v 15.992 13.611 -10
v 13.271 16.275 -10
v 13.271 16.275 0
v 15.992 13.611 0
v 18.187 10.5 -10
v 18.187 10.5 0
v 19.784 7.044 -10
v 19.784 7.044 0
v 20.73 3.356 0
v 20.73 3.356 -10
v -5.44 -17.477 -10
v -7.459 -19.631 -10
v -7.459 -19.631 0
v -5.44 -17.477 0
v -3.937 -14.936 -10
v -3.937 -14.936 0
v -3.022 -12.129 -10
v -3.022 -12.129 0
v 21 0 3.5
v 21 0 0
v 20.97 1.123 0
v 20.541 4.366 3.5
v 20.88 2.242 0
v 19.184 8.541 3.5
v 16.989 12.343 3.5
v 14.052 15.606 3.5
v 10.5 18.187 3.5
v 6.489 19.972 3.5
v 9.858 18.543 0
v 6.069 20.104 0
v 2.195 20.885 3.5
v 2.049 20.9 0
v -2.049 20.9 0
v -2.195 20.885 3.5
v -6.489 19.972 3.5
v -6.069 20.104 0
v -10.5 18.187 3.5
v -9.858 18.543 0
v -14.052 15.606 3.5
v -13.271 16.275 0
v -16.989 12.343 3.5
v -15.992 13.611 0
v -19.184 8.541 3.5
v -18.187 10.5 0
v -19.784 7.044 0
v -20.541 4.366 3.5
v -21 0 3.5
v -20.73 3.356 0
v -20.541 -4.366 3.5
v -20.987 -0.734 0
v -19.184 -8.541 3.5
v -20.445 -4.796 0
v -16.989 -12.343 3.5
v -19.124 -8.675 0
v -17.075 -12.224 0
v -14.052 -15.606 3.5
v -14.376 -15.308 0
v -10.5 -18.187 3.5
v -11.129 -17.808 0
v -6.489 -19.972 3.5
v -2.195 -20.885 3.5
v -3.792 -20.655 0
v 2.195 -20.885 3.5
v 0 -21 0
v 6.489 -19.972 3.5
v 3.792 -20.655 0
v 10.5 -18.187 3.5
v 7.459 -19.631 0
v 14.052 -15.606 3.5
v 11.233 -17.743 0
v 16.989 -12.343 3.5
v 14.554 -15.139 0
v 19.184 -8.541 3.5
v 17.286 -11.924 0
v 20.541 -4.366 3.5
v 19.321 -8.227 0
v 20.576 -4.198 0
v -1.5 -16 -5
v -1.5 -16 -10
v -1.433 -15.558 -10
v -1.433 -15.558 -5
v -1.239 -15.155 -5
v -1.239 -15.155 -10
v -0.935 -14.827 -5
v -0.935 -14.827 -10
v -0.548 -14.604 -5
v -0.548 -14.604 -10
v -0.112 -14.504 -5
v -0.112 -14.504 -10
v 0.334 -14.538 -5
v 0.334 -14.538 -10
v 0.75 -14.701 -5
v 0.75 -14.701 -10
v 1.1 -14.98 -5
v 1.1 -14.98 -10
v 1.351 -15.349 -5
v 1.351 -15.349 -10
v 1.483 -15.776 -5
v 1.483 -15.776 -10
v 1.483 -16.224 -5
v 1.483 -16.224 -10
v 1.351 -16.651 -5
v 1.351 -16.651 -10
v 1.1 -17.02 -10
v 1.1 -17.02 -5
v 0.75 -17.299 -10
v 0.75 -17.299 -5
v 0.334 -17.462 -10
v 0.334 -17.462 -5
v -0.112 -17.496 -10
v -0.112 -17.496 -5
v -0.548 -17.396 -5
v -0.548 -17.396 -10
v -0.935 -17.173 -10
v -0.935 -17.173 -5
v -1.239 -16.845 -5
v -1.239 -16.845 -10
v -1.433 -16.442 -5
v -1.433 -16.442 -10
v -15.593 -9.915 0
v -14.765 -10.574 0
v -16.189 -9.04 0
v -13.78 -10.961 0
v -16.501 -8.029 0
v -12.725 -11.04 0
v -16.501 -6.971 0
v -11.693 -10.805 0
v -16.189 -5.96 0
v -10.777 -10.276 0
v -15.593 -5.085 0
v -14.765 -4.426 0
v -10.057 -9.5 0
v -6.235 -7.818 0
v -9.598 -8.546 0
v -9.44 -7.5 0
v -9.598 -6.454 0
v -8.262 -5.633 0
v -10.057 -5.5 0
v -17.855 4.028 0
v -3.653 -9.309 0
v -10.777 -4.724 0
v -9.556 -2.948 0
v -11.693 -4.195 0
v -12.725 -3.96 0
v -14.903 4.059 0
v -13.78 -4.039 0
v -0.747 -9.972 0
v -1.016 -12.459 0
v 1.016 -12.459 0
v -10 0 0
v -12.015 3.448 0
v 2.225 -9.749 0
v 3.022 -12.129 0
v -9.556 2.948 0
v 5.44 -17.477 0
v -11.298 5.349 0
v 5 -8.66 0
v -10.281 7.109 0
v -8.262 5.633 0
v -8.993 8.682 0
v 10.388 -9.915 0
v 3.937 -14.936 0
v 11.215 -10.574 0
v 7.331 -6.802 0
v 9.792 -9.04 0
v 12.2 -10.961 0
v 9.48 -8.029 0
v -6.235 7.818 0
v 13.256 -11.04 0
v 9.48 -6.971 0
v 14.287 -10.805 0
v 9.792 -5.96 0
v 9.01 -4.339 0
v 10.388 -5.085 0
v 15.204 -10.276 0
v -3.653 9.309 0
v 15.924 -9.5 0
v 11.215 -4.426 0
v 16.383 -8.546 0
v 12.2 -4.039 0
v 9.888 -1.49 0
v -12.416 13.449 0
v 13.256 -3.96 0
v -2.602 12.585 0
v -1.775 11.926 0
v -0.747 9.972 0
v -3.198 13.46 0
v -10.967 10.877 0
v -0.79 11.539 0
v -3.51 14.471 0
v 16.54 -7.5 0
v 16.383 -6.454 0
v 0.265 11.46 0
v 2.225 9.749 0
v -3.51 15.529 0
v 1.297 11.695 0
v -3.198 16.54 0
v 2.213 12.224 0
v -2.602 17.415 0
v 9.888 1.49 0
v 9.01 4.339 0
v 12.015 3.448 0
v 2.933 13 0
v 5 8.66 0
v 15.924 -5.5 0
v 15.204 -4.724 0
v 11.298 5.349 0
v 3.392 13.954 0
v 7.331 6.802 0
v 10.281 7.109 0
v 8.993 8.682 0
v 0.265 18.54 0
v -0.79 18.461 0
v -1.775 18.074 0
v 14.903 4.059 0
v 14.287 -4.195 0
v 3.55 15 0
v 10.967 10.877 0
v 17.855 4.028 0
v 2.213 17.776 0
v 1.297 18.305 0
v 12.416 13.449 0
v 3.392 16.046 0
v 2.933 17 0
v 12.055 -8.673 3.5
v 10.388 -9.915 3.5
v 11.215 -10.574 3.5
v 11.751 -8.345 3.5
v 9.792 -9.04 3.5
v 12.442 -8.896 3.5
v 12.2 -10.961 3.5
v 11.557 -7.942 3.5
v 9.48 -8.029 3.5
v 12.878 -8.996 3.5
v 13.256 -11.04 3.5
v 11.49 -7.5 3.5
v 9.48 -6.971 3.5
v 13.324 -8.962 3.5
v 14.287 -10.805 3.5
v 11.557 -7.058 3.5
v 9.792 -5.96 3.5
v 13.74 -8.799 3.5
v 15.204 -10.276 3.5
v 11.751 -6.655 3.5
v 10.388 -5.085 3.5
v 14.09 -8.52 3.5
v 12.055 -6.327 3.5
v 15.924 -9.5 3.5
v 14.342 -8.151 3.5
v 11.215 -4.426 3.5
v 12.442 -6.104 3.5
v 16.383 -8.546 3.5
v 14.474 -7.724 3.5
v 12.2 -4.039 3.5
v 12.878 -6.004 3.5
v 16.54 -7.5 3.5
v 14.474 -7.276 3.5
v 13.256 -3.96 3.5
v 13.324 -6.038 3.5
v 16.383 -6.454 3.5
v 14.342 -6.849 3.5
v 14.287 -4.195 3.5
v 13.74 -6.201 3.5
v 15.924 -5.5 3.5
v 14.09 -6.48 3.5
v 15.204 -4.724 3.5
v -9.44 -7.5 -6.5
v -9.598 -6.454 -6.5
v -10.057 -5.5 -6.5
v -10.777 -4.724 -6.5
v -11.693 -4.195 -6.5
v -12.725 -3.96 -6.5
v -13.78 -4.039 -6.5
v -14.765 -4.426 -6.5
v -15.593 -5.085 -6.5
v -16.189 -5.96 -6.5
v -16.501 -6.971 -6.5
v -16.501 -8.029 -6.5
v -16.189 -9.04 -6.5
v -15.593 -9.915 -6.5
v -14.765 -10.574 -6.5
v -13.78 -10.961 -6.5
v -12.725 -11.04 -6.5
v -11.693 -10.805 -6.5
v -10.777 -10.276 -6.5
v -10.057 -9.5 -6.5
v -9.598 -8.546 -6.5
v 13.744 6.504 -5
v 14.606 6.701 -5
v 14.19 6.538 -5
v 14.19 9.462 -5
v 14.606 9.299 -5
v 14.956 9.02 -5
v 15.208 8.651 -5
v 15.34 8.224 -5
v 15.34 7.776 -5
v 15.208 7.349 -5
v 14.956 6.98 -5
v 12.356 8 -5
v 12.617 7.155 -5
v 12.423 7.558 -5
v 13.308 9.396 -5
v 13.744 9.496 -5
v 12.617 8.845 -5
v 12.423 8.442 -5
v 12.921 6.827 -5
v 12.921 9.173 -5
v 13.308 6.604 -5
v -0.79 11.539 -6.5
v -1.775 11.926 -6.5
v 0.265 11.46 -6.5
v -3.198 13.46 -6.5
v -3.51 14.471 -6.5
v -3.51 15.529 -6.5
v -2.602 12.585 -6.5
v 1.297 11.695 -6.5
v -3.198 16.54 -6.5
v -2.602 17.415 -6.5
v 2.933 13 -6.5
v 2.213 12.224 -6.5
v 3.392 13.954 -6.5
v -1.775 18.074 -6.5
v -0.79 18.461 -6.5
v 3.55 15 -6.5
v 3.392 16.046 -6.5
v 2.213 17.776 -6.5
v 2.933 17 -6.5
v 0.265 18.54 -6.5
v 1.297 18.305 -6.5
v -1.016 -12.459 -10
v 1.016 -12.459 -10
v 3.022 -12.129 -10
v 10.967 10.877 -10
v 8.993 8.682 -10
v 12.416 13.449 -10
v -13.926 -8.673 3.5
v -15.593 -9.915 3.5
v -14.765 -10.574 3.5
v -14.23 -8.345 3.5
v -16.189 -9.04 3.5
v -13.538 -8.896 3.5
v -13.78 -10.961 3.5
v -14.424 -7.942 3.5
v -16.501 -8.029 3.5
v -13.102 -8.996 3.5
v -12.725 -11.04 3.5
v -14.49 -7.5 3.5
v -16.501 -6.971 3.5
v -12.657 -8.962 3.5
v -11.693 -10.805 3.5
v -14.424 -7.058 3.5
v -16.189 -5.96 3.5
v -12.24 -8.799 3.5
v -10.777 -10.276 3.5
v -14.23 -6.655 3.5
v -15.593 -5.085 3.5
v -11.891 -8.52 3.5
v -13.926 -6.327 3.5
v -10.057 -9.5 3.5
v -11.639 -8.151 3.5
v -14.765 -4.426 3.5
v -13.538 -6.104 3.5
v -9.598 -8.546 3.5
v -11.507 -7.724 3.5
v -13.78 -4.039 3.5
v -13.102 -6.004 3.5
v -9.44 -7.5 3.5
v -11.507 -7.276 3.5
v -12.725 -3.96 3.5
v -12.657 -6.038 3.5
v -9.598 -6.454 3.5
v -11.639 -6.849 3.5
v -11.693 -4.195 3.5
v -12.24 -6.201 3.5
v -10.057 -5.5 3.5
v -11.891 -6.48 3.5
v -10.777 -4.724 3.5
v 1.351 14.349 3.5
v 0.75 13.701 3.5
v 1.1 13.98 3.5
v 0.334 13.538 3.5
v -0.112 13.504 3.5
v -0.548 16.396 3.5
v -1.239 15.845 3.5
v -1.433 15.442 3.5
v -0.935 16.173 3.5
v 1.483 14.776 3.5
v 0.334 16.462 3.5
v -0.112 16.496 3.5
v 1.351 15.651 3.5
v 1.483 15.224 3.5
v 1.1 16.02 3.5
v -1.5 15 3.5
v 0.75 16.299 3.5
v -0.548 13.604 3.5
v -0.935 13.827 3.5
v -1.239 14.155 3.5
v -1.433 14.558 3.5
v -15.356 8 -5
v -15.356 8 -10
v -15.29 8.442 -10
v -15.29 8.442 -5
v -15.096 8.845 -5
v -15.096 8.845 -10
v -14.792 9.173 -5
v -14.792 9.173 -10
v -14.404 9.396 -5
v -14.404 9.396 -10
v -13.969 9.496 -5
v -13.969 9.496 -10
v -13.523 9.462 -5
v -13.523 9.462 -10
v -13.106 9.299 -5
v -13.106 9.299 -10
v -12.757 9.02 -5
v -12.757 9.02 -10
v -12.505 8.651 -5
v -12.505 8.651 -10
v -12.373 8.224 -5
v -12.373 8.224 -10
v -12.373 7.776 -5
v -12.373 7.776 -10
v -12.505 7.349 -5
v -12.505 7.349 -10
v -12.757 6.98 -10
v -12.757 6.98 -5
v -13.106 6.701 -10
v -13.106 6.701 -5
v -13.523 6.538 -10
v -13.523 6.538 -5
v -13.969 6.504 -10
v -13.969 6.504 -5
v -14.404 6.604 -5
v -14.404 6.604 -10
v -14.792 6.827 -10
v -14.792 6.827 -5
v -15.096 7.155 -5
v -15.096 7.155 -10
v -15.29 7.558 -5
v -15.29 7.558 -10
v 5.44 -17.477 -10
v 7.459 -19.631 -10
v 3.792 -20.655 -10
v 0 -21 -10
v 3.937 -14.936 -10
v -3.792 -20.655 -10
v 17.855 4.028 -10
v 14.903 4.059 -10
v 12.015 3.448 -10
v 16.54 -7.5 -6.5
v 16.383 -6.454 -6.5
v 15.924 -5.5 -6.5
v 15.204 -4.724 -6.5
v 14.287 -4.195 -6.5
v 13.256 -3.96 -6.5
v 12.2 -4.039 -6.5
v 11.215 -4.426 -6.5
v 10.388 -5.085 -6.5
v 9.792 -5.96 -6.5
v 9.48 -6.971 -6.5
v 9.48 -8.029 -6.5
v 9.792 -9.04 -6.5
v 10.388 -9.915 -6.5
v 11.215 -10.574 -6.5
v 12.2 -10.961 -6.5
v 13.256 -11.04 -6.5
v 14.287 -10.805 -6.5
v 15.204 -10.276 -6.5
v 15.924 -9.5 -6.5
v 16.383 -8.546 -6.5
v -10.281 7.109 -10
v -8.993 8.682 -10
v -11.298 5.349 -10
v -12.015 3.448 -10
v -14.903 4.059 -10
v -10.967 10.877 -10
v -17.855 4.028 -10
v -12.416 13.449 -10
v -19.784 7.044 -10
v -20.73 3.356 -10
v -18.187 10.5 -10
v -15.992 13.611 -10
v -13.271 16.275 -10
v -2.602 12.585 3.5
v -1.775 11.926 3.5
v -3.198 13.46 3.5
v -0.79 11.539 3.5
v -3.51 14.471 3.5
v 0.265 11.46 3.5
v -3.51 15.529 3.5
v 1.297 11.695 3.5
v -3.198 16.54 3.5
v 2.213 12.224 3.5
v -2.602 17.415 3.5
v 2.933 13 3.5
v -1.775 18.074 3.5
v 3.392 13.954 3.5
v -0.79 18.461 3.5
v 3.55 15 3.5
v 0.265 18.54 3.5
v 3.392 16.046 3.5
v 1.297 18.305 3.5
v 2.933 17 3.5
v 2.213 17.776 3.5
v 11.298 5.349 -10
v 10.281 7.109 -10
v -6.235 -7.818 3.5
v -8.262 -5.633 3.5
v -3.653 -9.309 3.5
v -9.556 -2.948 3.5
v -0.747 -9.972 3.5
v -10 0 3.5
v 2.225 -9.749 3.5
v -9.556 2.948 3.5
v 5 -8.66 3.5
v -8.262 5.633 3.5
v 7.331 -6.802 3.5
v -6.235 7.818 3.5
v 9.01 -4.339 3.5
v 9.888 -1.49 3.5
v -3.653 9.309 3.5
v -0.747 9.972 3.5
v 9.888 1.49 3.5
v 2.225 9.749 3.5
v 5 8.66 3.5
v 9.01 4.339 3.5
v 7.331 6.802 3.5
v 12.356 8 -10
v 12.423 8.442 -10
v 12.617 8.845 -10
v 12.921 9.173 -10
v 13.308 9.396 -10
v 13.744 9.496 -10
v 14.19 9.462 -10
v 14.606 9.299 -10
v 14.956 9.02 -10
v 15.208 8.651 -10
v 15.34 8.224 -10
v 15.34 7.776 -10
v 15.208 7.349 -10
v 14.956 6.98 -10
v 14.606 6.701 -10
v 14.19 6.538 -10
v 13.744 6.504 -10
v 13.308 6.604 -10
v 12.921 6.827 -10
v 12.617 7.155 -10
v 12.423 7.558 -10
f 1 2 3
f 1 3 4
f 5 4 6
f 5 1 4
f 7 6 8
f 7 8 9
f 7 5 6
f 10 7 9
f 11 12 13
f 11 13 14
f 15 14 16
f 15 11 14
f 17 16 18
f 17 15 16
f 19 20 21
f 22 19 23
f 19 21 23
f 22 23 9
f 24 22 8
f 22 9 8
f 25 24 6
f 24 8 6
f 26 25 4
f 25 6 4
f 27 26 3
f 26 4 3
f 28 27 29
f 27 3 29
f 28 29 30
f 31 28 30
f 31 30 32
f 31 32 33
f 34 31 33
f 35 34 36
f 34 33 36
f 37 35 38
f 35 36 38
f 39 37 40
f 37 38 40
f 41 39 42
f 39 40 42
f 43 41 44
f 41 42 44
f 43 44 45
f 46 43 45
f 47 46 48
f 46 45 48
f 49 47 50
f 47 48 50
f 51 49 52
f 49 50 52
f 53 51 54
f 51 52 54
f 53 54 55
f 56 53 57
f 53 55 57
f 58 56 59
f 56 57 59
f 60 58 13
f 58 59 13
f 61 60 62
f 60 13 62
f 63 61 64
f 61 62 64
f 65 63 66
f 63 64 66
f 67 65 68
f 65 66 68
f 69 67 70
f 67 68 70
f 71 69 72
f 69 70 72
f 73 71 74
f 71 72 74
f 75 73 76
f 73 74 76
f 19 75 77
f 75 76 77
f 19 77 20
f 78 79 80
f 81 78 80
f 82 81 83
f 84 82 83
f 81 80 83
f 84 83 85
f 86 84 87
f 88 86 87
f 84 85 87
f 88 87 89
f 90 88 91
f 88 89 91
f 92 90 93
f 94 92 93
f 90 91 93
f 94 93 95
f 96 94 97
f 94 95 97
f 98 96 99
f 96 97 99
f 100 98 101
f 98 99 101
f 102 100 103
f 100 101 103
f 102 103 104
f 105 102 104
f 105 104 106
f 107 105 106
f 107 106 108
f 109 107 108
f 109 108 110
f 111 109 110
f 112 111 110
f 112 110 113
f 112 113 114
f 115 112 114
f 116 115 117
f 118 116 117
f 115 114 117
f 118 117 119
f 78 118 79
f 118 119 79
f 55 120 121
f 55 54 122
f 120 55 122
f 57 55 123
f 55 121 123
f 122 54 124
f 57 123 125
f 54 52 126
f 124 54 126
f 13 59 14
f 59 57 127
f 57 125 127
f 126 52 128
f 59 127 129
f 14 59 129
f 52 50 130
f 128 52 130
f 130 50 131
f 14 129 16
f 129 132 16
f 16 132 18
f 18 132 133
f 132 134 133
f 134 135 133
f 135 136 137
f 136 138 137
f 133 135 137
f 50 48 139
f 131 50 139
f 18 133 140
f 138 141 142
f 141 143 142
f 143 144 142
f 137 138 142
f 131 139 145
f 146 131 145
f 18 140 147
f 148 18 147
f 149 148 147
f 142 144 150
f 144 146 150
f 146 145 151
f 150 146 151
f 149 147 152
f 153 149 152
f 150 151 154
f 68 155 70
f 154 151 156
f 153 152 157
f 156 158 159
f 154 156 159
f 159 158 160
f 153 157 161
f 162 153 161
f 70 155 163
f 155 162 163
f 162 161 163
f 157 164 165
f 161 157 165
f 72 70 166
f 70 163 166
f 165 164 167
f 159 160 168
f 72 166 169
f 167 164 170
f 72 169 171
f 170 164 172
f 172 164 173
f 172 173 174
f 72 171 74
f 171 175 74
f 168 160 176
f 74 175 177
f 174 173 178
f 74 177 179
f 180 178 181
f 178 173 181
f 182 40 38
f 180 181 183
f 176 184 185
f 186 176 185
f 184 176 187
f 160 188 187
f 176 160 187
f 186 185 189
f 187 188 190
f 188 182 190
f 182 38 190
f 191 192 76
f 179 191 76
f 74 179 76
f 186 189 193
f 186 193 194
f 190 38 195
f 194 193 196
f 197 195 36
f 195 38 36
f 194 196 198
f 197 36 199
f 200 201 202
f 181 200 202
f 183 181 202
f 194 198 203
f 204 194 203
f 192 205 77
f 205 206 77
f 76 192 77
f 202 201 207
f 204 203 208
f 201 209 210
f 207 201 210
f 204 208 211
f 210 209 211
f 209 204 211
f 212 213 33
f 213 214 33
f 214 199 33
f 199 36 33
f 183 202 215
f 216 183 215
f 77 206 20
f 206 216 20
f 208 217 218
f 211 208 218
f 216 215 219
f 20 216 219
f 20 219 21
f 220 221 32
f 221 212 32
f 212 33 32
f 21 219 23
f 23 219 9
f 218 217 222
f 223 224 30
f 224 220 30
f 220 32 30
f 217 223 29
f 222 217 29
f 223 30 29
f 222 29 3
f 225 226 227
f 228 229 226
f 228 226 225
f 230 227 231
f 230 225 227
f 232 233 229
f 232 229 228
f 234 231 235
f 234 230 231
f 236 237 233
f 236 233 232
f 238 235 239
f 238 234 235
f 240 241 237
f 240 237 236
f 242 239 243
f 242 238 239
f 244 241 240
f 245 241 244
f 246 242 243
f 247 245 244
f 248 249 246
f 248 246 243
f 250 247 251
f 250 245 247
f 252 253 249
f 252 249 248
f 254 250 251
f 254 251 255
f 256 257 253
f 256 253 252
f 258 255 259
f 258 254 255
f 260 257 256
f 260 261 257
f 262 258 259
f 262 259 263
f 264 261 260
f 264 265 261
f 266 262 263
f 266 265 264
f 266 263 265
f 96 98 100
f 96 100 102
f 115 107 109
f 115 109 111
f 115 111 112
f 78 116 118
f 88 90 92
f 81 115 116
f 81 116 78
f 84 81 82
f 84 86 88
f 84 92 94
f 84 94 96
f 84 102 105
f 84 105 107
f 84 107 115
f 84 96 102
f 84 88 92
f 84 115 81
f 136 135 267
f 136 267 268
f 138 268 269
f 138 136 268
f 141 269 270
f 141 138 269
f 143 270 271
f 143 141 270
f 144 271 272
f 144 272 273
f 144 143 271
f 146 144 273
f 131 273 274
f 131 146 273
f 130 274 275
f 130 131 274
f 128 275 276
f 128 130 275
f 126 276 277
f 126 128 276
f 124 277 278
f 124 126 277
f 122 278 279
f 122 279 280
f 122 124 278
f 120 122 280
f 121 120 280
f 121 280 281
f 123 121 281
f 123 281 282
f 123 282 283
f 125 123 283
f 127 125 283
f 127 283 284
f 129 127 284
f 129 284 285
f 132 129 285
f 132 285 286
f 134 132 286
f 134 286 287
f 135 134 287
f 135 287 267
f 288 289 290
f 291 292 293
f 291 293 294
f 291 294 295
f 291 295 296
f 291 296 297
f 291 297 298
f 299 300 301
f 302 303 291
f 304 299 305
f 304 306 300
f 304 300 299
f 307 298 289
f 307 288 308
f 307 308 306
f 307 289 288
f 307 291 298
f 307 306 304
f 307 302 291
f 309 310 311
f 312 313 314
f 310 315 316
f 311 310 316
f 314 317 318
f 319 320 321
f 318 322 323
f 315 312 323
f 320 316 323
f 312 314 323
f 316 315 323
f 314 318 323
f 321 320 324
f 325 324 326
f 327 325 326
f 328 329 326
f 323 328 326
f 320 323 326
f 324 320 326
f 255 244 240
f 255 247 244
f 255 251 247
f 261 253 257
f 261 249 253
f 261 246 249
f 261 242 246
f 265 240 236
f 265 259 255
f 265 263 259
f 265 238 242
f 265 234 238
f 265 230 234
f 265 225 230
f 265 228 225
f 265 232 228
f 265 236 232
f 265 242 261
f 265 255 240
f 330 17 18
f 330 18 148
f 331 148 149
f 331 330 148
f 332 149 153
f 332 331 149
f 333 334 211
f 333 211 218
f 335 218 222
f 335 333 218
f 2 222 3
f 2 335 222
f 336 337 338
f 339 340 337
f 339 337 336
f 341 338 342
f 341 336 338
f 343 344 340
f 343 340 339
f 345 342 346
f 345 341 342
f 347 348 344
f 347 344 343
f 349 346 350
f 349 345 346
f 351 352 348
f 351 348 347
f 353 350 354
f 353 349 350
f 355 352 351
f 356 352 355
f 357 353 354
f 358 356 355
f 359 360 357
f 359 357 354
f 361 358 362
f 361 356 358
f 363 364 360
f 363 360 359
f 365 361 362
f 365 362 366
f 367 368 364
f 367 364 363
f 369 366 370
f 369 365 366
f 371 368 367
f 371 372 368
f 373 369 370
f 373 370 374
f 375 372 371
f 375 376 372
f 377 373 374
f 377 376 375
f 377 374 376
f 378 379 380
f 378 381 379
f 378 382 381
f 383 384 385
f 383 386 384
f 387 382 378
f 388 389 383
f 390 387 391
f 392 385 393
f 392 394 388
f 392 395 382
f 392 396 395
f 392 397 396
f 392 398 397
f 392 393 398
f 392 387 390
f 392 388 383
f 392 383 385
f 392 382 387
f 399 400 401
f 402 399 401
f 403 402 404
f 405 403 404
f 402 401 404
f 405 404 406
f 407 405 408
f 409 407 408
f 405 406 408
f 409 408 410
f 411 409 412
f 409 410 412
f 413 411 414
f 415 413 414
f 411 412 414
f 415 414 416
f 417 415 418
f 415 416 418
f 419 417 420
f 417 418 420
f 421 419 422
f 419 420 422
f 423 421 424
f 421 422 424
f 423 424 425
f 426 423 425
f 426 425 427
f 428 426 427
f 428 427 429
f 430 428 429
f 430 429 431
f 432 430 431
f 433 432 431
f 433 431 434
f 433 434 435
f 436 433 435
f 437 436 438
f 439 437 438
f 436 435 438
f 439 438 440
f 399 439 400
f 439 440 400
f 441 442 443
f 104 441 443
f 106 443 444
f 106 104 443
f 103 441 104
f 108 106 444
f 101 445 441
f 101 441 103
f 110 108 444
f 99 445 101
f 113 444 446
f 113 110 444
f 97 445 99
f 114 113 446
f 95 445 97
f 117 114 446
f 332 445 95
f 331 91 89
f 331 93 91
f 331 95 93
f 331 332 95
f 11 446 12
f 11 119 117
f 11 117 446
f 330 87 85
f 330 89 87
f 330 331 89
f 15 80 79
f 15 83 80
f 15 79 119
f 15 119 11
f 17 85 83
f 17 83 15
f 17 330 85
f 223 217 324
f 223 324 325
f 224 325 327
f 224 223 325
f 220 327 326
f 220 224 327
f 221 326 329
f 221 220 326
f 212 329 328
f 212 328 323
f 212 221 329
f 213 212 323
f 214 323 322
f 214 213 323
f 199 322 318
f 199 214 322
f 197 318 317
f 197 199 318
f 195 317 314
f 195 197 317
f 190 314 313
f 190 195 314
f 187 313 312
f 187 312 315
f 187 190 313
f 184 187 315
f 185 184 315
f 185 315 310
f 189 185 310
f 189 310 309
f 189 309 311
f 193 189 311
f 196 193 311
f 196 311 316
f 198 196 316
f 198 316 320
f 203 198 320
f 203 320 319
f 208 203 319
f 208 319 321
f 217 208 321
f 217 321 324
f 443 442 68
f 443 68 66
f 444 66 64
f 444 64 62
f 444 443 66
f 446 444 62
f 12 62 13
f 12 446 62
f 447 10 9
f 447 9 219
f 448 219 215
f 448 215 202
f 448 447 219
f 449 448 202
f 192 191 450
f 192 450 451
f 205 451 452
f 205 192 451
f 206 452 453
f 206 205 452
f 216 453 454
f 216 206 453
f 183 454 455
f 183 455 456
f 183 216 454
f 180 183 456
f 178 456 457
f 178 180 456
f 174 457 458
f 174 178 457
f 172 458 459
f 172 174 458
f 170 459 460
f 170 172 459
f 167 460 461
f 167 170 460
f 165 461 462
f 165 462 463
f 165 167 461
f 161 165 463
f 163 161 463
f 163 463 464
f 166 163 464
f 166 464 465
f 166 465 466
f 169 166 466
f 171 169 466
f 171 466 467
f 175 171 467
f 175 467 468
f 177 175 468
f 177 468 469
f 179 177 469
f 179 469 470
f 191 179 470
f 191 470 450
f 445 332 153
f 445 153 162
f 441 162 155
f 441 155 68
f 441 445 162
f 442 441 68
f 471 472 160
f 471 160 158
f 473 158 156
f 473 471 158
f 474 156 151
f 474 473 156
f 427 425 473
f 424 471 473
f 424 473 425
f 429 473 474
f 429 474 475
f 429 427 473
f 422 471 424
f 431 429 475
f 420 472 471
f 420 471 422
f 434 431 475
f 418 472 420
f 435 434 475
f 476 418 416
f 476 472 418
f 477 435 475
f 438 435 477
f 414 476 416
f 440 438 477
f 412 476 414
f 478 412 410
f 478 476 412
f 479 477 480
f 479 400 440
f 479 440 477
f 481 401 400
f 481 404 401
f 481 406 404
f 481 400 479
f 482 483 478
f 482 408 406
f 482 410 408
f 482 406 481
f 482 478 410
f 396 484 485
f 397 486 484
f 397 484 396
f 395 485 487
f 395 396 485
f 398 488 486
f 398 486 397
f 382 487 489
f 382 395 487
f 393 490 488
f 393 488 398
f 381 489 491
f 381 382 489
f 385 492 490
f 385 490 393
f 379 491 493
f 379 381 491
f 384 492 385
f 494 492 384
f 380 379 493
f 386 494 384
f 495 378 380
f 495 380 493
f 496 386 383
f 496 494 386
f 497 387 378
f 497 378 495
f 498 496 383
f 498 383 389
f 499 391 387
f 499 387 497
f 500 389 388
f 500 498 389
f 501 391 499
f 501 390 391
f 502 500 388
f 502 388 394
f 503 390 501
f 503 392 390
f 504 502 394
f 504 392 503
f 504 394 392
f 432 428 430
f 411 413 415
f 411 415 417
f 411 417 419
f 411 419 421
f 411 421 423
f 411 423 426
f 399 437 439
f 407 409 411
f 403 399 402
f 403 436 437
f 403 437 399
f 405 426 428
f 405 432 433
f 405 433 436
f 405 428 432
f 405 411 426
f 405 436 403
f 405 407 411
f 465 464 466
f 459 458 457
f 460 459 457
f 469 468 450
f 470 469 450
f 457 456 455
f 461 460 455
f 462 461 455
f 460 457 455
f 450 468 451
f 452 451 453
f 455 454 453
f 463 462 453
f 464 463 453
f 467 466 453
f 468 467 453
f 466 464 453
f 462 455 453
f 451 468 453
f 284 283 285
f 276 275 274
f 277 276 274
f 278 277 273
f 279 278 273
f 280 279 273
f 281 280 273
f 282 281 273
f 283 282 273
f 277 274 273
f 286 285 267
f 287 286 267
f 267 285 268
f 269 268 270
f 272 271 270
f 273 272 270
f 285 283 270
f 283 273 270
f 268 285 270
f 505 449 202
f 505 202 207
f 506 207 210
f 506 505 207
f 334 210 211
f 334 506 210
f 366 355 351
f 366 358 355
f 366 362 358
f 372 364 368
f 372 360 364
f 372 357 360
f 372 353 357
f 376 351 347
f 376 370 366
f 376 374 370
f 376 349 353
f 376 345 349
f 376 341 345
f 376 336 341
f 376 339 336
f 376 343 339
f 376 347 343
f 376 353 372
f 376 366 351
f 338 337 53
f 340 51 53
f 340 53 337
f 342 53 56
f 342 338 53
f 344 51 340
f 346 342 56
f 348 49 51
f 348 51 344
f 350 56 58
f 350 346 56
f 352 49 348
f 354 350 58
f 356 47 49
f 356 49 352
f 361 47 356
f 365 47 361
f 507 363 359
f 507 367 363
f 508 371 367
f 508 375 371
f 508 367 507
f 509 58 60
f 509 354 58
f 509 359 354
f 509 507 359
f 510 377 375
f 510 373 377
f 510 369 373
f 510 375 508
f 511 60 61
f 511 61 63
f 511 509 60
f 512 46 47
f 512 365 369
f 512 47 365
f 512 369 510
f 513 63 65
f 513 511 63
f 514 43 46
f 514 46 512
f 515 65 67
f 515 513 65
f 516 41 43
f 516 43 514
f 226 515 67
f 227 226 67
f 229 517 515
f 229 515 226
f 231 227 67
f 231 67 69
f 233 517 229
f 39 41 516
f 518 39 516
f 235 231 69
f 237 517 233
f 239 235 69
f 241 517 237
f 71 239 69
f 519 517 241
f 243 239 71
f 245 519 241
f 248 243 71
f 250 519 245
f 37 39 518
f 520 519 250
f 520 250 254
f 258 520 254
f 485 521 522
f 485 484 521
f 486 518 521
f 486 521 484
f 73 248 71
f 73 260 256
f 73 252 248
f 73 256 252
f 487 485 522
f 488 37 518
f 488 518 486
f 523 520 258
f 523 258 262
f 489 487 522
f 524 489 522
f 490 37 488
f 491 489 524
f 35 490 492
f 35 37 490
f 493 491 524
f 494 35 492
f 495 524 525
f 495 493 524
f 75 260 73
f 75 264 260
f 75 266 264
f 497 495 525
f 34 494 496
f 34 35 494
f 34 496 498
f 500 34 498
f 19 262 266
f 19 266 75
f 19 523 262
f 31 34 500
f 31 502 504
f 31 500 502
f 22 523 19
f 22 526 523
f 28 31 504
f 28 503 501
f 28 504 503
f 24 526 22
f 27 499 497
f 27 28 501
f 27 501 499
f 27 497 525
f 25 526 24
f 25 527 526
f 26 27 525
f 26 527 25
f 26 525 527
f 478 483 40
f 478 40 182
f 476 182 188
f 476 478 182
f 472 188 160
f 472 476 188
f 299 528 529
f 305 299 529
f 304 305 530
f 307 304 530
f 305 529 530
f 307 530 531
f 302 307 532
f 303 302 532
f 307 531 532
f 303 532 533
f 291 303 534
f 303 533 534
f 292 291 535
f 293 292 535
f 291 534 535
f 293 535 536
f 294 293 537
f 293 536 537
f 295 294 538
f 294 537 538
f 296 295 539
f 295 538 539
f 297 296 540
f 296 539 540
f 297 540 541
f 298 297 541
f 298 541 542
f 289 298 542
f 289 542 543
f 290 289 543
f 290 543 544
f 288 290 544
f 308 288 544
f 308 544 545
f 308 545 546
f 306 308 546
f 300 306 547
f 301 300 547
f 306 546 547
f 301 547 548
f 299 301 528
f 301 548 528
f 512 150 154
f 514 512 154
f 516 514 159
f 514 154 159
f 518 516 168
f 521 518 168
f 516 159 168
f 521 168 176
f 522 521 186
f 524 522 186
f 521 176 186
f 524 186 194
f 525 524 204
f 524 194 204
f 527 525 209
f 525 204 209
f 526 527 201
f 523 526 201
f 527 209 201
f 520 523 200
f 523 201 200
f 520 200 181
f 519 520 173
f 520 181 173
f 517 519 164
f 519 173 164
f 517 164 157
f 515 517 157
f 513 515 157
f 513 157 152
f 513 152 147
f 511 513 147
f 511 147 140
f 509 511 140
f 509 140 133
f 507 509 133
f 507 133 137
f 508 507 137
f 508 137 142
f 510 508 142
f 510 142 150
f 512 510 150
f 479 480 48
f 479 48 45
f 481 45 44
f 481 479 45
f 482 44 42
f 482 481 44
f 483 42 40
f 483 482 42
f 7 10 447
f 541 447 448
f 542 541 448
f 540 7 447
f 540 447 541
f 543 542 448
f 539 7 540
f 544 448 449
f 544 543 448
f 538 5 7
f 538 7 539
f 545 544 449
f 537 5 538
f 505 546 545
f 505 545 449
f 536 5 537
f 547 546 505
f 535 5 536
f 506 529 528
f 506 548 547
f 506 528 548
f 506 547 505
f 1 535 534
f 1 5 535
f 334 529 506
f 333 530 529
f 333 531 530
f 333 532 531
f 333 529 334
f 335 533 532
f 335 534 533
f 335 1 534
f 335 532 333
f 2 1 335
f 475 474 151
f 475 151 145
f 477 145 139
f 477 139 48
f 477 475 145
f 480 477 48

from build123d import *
from build123d.topology import SkipClean

# Parameters (mm, degrees)
SKETCH1_R           = 21
BOSS_EXTRUDE1_DEPTH = 3.5
SKETCH4_R           = 10
CUT_EXTRUDE1_DEPTH  = 8.2
SKETCH11_R          = 1.5
CUT_EXTRUDE2_DEPTH  = 10
BOSS_EXTRUDE2_START = 10
BOSS_EXTRUDE2_DEPTH = 10
SKETCH14_R          = 1.5
CUT_EXTRUDE3_DEPTH  = 5
SKETCH16_R          = 3.55
BOSS_EXTRUDE3_DEPTH = 10


with BuildPart() as part:
    # Sketch1 → Boss-Extrude1 (new body)
    with BuildSketch(Plane.XY):
        Circle(SKETCH1_R)
    extrude(amount=BOSS_EXTRUDE1_DEPTH)

    # Sketch4 → Cut-Extrude1 (cut)
    with BuildSketch(Plane(origin=(0, 0, 0), x_dir=(-1, 0, 0), z_dir=(0, 0, -1))):
        Circle(SKETCH4_R)
    extrude(amount=-CUT_EXTRUDE1_DEPTH, mode=Mode.SUBTRACT)

    # Sketch11 → Cut-Extrude2 (cut)
    with BuildSketch(Plane(origin=(0, 0, 0), x_dir=(-1, 0, 0), z_dir=(0, 0, -1))):
        with Locations((0, 15)):
            Circle(SKETCH11_R)
        with Locations((12.990381057, -7.5)):
            Circle(SKETCH11_R)
        with Locations((-12.990381057, -7.5)):
            Circle(SKETCH11_R)
    extrude(amount=-CUT_EXTRUDE2_DEPTH, mode=Mode.SUBTRACT)

    # Sketch3 → Boss-Extrude2 (add)
    with SkipClean():  # the faces are left unmerged after this step: merging them gives an invalid solid
        with BuildSketch(Plane(origin=(0, 0, 0), x_dir=(-1, 0, 0), z_dir=(0, 0, -1)).offset(BOSS_EXTRUDE2_START)):
            with BuildLine():
                ThreePointArc((-3.021915591, -12.129221993), (-4.618435811, -16.247865366), (-7.4589705, -19.630684121))
                ThreePointArc((-7.4589705, -19.630684121), (0, -21), (7.4589705, -19.630684121))
                ThreePointArc((7.4589705, -19.630684121), (4.618435811, -16.247865366), (3.021915591, -12.129221993))
                ThreePointArc((3.021915591, -12.129221993), (0, -12.5), (-3.021915591, -12.129221993))
            make_face()
            with BuildLine():
                ThreePointArc((-20.730156393, 3.355684121), (-16.38028207, 4.124249945), (-12.01517217, 3.447555327))
                ThreePointArc((-12.01517217, 3.447555327), (-10.825317547, 6.25), (-8.993256579, 8.681666667))
                ThreePointArc((-8.993256579, 8.681666667), (-11.761846259, 12.123615422), (-13.271185893, 16.275))
                ThreePointArc((-13.271185893, 16.275), (-18.186533479, 10.5), (-20.730156393, 3.355684121))
            make_face()
            with BuildLine():
                ThreePointArc((8.993256579, 8.681666667), (10.825317547, 6.25), (12.01517217, 3.447555327))
                ThreePointArc((12.01517217, 3.447555327), (16.38028207, 4.124249945), (20.730156393, 3.355684121))
                ThreePointArc((20.730156393, 3.355684121), (18.186533479, 10.5), (13.271185893, 16.275))
                ThreePointArc((13.271185893, 16.275), (11.761846259, 12.123615422), (8.993256579, 8.681666667))
            make_face()
        extrude(amount=-BOSS_EXTRUDE2_DEPTH)

    # Sketch14 → Cut-Extrude3 (cut)
    with SkipClean():  # the faces are left unmerged after this step: merging them gives an invalid solid
        with BuildSketch(Plane(origin=(0, 0, -10), x_dir=(-1, 0, 0), z_dir=(0, 0, -1))):
            with Locations((13.856406461, 8)):
                Circle(SKETCH14_R)
            with Locations((0, -16)):
                Circle(SKETCH14_R)
            with Locations((-13.856406461, 8)):
                Circle(SKETCH14_R)
        extrude(amount=-CUT_EXTRUDE3_DEPTH, mode=Mode.SUBTRACT)

    # Sketch16 → Boss-Extrude3 (add)
    with SkipClean():  # the faces are left unmerged after this step: merging them gives an invalid solid
        with BuildSketch(Plane.XY.offset(3.5)):
            with Locations((0, 15)):
                Circle(SKETCH16_R)
            with Locations((12.990381057, -7.5)):
                Circle(SKETCH16_R)
            with Locations((-12.990381057, -7.5)):
                Circle(SKETCH16_R)
        extrude(amount=-BOSS_EXTRUDE3_DEPTH)


solid = part.part
